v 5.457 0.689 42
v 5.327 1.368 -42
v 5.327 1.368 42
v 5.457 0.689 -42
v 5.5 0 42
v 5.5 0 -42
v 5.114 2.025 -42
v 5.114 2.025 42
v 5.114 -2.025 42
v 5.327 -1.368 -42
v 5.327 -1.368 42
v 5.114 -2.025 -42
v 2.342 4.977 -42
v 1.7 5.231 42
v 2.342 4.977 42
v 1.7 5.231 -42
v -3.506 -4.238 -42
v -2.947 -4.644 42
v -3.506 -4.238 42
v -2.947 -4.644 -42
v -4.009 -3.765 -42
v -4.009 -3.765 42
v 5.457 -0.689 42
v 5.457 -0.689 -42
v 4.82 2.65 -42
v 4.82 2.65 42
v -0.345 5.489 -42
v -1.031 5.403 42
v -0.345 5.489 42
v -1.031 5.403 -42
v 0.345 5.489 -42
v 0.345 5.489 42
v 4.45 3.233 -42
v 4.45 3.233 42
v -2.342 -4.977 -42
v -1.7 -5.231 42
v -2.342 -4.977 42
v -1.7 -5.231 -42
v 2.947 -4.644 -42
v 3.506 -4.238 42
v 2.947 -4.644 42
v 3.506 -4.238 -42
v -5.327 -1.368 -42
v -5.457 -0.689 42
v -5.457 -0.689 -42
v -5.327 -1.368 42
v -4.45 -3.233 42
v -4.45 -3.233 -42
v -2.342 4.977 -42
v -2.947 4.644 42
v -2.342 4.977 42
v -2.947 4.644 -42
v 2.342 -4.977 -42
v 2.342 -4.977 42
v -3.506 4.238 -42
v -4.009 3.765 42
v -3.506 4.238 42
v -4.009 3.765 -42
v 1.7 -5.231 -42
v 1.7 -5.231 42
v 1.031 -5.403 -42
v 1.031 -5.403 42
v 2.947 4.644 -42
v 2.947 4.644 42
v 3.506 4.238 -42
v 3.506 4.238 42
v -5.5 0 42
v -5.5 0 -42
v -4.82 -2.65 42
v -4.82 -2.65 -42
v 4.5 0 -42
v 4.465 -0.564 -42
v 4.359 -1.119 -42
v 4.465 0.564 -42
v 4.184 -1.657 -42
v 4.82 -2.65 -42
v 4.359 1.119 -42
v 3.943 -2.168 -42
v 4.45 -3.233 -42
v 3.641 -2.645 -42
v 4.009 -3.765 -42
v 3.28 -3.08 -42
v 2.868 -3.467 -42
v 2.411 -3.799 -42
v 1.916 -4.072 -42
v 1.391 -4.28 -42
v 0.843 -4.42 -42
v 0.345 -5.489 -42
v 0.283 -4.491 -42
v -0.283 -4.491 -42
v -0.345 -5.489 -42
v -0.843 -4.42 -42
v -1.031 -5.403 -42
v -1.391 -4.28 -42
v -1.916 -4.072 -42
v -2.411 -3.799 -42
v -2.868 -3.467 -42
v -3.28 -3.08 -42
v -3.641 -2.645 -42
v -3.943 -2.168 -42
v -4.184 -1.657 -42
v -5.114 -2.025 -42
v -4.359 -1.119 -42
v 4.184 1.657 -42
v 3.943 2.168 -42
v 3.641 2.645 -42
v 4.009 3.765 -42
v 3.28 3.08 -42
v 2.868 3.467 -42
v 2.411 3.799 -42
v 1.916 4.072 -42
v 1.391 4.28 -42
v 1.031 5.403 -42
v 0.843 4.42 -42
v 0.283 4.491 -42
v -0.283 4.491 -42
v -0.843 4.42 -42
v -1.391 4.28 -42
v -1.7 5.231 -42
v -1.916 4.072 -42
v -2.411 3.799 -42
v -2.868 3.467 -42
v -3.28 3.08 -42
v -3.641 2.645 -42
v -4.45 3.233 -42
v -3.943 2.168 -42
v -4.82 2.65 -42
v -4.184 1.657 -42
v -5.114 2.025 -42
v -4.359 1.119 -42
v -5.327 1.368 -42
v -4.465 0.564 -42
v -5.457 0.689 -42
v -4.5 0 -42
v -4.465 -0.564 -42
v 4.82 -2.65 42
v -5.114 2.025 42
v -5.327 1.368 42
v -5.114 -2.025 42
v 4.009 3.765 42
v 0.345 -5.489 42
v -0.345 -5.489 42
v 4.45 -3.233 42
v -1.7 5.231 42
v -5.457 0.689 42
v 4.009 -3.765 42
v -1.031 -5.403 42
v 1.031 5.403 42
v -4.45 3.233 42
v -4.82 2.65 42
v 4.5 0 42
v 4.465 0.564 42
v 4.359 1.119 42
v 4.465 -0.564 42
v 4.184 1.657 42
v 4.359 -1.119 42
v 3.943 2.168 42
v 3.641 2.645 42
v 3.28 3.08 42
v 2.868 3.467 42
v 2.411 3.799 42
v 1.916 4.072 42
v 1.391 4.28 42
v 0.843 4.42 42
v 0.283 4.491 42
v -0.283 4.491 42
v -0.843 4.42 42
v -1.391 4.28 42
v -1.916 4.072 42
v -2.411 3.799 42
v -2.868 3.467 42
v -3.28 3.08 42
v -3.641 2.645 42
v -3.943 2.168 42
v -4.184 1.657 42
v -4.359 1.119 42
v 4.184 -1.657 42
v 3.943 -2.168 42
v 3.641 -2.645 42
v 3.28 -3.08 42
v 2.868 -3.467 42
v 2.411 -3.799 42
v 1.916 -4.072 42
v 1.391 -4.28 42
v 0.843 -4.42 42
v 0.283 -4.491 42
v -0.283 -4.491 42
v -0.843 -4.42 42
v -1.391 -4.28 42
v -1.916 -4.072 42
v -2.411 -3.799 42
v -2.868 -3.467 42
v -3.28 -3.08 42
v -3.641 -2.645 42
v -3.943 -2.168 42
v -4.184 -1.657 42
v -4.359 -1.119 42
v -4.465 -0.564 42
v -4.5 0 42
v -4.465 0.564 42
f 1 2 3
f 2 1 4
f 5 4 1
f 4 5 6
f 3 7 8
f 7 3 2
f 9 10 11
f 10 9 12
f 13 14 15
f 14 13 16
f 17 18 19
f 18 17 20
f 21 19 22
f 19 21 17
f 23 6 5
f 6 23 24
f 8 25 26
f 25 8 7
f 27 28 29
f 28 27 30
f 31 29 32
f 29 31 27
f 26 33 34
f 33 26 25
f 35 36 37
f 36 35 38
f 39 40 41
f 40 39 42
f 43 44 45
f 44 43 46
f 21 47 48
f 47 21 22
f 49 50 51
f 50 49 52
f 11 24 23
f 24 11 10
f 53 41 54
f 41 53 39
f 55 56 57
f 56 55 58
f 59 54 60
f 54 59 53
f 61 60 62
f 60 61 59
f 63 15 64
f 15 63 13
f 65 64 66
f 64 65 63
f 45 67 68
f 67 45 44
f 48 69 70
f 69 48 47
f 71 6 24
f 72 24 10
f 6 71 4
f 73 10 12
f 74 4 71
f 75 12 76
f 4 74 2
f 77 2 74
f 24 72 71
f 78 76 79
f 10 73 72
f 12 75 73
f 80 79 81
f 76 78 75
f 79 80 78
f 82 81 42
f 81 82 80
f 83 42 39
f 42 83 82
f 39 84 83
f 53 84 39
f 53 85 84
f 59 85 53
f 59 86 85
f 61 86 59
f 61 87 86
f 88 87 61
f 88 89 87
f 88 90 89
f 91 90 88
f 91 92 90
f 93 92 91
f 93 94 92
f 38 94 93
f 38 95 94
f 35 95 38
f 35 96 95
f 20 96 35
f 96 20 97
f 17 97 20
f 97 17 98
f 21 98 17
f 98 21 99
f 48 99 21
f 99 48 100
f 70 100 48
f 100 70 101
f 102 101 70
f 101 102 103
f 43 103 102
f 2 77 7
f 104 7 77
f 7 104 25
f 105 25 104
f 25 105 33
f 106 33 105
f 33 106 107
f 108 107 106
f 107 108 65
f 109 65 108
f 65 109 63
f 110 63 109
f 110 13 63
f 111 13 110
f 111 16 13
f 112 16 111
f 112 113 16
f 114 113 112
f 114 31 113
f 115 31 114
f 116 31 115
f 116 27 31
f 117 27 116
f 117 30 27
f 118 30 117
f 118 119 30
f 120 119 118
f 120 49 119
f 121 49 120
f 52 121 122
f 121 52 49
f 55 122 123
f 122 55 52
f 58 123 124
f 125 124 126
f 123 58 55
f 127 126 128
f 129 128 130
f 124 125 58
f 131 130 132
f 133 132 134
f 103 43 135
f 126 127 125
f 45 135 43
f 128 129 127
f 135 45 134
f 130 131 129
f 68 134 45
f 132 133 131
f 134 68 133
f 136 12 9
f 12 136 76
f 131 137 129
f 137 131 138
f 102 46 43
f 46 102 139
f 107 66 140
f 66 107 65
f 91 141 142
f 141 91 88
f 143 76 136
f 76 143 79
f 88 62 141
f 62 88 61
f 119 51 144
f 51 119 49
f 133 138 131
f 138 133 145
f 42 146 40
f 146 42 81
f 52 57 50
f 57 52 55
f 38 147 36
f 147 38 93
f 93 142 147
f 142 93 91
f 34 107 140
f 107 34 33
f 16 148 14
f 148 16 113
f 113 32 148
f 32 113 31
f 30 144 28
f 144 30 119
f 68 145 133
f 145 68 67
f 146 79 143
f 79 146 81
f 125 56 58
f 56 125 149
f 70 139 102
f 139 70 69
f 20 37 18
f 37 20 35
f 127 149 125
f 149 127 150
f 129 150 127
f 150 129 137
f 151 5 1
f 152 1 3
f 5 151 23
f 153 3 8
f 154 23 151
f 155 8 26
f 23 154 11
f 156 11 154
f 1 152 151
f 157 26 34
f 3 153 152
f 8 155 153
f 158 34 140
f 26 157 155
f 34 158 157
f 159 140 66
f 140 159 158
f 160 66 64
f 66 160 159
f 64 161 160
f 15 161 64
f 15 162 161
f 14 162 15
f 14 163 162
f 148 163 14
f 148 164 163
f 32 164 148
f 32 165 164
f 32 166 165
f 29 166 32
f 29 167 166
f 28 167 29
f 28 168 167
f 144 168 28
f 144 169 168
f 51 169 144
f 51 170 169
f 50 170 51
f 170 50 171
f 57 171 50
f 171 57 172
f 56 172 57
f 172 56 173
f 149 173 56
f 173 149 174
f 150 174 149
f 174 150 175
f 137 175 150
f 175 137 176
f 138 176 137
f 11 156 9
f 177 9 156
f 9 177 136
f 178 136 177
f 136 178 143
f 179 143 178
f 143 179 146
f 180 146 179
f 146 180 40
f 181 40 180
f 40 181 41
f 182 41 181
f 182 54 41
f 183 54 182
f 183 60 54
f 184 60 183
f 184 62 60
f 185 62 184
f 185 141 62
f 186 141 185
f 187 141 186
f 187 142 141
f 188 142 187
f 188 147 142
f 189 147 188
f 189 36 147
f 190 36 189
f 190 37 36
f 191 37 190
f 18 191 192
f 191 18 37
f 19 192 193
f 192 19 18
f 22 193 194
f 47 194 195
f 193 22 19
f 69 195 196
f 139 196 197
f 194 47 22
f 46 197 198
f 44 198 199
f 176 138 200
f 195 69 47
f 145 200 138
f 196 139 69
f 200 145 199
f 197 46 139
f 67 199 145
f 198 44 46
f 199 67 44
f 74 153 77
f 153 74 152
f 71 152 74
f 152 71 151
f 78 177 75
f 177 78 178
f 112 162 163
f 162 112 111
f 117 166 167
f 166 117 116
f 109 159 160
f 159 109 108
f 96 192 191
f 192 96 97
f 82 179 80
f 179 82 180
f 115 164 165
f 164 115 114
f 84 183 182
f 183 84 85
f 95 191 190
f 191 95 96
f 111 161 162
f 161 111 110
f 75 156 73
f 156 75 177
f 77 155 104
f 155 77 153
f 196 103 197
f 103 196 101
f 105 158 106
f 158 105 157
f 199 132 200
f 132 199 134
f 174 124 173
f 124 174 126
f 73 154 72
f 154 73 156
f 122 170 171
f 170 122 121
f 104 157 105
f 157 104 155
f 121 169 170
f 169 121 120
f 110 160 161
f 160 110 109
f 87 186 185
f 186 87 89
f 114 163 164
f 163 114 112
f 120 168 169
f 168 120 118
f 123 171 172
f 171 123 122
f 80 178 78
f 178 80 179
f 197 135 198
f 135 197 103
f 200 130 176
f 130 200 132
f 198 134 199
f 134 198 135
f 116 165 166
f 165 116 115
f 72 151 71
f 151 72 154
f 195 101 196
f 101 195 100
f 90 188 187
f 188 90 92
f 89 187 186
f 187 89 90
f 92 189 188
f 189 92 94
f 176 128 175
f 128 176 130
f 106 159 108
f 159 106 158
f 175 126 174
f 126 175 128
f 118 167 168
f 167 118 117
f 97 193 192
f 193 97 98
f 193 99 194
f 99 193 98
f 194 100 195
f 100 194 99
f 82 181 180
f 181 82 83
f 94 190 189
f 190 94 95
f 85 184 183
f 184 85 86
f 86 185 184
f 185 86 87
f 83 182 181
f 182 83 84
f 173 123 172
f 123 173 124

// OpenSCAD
$fn = 50;


difference() {
	union() {
		translate(v = [0, 0, -42.0000000000]) {
			cylinder(h = 84, r = 5.5000000000);
		}
	}
	union() {
		translate(v = [0, 0, -100.0000000000]) {
			cylinder(h = 200, r = 4.5000000000);
		}
	}
}
